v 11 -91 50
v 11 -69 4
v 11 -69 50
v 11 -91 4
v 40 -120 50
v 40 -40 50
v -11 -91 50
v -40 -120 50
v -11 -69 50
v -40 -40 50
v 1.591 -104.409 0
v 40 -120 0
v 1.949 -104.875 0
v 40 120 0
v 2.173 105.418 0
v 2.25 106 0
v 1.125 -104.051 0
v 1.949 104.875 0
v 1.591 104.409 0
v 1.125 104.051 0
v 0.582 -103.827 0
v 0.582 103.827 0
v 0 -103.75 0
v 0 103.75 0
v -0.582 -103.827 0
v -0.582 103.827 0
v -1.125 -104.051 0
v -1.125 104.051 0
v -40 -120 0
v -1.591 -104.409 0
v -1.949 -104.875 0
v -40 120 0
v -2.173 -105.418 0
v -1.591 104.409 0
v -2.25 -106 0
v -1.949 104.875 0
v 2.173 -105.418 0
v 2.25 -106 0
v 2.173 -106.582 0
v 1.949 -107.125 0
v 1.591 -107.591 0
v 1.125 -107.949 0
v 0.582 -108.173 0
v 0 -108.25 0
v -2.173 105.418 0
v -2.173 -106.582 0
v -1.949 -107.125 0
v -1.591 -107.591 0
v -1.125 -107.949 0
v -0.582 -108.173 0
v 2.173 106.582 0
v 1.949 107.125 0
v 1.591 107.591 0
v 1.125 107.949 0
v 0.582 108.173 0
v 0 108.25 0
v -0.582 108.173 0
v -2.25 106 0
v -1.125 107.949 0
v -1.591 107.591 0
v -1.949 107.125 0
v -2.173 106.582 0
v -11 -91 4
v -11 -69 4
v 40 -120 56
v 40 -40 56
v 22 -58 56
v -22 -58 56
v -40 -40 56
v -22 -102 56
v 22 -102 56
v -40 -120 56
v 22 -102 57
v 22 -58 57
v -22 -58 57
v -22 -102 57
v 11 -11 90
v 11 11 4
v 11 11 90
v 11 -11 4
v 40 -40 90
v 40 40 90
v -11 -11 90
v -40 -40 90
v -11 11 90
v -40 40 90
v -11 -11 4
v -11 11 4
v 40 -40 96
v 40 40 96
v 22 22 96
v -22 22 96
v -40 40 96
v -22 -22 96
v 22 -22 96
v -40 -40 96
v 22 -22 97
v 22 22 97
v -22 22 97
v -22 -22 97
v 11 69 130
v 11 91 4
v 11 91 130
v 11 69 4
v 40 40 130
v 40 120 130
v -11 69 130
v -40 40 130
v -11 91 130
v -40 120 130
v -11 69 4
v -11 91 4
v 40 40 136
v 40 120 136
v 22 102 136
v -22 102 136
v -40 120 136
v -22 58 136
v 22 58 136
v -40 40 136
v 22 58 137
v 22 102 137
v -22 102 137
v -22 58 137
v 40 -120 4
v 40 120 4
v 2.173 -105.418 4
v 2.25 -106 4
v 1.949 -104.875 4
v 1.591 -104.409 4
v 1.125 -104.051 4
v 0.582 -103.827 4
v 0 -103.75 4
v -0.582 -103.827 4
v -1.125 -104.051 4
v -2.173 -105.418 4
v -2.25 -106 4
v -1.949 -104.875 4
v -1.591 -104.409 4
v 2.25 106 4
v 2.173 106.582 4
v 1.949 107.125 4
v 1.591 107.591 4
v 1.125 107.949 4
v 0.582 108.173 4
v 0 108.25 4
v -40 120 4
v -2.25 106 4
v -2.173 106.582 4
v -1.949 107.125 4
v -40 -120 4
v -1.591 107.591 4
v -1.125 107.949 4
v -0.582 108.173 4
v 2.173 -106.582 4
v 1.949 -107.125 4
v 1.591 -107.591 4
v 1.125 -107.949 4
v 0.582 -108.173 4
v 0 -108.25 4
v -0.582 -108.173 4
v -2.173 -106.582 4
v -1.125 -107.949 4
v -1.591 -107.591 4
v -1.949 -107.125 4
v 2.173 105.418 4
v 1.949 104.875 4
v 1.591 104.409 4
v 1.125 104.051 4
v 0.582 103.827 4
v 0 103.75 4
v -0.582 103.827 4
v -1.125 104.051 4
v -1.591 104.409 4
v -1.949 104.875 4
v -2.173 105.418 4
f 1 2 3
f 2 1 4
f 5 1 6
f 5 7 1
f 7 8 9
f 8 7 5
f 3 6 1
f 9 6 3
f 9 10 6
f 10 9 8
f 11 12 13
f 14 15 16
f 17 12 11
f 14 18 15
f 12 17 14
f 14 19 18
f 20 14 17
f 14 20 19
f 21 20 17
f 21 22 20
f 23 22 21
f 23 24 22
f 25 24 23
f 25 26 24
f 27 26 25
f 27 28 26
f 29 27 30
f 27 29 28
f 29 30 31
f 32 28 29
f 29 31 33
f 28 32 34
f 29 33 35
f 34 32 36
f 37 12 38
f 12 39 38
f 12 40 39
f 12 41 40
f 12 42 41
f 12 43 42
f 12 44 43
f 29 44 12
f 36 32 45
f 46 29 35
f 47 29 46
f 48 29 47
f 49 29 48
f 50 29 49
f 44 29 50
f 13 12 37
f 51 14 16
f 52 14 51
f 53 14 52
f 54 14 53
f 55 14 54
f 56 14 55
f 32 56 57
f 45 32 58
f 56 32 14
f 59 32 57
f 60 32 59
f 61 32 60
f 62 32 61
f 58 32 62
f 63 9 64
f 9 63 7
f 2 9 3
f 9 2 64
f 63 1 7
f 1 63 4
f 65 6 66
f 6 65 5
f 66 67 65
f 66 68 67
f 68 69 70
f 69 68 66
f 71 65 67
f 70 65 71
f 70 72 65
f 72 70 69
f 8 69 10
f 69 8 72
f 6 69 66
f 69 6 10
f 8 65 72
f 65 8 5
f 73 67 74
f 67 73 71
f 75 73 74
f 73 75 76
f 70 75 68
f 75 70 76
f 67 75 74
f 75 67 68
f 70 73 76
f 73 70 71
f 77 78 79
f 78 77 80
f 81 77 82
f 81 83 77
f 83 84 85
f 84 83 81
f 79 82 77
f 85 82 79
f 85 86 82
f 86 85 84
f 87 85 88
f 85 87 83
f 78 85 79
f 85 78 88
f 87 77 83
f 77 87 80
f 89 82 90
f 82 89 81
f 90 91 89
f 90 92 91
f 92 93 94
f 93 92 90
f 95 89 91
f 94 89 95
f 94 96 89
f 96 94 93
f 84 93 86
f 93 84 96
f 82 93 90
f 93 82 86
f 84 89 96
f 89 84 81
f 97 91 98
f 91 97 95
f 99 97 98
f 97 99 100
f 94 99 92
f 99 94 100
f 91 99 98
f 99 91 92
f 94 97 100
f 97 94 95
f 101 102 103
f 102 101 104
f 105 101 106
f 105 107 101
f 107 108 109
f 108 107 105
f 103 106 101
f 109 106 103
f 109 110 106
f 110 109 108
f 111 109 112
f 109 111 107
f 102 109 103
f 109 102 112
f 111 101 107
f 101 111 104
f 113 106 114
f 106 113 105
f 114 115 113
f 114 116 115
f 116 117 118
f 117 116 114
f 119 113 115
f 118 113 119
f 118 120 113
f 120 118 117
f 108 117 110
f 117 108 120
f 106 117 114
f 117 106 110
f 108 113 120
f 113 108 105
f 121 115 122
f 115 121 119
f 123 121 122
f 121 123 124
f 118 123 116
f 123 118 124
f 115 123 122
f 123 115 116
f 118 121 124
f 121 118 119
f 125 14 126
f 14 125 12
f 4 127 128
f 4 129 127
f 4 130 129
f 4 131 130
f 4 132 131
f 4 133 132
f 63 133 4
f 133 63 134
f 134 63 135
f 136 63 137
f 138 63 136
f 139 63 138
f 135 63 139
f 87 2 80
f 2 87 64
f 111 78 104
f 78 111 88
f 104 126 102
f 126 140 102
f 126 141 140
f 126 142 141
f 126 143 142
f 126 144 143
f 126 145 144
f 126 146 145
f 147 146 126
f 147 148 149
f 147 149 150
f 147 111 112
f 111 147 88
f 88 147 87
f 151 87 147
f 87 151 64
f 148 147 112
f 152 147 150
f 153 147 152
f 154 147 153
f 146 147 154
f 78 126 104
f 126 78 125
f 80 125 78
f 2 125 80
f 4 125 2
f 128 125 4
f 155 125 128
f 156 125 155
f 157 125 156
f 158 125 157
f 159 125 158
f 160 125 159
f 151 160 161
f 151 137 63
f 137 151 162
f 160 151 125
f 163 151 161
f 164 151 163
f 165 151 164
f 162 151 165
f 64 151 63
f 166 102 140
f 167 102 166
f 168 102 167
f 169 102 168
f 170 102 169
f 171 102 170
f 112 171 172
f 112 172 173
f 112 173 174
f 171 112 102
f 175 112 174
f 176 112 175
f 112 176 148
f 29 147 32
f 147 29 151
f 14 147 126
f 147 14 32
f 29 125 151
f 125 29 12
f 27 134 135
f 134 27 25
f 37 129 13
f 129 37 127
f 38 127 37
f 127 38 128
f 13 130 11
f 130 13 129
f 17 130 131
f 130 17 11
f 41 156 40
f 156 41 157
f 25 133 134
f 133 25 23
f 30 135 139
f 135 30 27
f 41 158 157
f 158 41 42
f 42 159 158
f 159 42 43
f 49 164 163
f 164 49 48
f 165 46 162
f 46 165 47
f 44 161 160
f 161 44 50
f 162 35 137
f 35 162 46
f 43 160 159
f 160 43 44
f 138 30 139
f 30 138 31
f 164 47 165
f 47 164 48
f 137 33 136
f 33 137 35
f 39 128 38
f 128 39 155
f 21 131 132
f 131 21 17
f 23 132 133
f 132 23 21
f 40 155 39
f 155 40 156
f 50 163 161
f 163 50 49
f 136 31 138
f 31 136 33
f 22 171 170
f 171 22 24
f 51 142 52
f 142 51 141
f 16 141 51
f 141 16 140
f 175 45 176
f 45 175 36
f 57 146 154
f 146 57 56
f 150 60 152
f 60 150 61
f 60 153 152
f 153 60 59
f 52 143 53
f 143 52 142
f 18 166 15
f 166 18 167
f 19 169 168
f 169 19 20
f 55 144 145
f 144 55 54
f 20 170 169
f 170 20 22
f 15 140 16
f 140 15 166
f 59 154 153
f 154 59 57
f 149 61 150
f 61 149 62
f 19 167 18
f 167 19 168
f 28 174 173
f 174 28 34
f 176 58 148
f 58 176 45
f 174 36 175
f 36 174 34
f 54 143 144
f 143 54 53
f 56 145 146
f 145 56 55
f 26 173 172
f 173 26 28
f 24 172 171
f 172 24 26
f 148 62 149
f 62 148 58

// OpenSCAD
// file: ../models/drone-playground-landing-staircase/model.scad
pad_size=80; pad_heights=[50,90,130]; pad_thickness=6; mount_hole_diameter=4.5;
module landing_staircase(){ difference(){ union(){ translate([-40,-120,0]) cube([80,240,4]); for(i=[0:2]) { y=-80+i*80; translate([-11,y-11,0]) cube([22,22,pad_heights[i]]); translate([-40,y-40,pad_heights[i]]) cube([pad_size,pad_size,pad_thickness]); translate([-22,y-22,pad_heights[i]+pad_thickness]) cube([44,44,1]); } } for(y=[-106,106]) translate([0,y,-1]) cylinder(d=mount_hole_diameter,h=7,$fn=24); }}
assert(pad_size==80 && pad_heights[2]==130); echo("SCADCTL_REQUIREMENT:parameters:PASS"); landing_staircase();
// main file
use <../models/drone-playground-landing-staircase/model.scad>
color("goldenrod") landing_staircase();
